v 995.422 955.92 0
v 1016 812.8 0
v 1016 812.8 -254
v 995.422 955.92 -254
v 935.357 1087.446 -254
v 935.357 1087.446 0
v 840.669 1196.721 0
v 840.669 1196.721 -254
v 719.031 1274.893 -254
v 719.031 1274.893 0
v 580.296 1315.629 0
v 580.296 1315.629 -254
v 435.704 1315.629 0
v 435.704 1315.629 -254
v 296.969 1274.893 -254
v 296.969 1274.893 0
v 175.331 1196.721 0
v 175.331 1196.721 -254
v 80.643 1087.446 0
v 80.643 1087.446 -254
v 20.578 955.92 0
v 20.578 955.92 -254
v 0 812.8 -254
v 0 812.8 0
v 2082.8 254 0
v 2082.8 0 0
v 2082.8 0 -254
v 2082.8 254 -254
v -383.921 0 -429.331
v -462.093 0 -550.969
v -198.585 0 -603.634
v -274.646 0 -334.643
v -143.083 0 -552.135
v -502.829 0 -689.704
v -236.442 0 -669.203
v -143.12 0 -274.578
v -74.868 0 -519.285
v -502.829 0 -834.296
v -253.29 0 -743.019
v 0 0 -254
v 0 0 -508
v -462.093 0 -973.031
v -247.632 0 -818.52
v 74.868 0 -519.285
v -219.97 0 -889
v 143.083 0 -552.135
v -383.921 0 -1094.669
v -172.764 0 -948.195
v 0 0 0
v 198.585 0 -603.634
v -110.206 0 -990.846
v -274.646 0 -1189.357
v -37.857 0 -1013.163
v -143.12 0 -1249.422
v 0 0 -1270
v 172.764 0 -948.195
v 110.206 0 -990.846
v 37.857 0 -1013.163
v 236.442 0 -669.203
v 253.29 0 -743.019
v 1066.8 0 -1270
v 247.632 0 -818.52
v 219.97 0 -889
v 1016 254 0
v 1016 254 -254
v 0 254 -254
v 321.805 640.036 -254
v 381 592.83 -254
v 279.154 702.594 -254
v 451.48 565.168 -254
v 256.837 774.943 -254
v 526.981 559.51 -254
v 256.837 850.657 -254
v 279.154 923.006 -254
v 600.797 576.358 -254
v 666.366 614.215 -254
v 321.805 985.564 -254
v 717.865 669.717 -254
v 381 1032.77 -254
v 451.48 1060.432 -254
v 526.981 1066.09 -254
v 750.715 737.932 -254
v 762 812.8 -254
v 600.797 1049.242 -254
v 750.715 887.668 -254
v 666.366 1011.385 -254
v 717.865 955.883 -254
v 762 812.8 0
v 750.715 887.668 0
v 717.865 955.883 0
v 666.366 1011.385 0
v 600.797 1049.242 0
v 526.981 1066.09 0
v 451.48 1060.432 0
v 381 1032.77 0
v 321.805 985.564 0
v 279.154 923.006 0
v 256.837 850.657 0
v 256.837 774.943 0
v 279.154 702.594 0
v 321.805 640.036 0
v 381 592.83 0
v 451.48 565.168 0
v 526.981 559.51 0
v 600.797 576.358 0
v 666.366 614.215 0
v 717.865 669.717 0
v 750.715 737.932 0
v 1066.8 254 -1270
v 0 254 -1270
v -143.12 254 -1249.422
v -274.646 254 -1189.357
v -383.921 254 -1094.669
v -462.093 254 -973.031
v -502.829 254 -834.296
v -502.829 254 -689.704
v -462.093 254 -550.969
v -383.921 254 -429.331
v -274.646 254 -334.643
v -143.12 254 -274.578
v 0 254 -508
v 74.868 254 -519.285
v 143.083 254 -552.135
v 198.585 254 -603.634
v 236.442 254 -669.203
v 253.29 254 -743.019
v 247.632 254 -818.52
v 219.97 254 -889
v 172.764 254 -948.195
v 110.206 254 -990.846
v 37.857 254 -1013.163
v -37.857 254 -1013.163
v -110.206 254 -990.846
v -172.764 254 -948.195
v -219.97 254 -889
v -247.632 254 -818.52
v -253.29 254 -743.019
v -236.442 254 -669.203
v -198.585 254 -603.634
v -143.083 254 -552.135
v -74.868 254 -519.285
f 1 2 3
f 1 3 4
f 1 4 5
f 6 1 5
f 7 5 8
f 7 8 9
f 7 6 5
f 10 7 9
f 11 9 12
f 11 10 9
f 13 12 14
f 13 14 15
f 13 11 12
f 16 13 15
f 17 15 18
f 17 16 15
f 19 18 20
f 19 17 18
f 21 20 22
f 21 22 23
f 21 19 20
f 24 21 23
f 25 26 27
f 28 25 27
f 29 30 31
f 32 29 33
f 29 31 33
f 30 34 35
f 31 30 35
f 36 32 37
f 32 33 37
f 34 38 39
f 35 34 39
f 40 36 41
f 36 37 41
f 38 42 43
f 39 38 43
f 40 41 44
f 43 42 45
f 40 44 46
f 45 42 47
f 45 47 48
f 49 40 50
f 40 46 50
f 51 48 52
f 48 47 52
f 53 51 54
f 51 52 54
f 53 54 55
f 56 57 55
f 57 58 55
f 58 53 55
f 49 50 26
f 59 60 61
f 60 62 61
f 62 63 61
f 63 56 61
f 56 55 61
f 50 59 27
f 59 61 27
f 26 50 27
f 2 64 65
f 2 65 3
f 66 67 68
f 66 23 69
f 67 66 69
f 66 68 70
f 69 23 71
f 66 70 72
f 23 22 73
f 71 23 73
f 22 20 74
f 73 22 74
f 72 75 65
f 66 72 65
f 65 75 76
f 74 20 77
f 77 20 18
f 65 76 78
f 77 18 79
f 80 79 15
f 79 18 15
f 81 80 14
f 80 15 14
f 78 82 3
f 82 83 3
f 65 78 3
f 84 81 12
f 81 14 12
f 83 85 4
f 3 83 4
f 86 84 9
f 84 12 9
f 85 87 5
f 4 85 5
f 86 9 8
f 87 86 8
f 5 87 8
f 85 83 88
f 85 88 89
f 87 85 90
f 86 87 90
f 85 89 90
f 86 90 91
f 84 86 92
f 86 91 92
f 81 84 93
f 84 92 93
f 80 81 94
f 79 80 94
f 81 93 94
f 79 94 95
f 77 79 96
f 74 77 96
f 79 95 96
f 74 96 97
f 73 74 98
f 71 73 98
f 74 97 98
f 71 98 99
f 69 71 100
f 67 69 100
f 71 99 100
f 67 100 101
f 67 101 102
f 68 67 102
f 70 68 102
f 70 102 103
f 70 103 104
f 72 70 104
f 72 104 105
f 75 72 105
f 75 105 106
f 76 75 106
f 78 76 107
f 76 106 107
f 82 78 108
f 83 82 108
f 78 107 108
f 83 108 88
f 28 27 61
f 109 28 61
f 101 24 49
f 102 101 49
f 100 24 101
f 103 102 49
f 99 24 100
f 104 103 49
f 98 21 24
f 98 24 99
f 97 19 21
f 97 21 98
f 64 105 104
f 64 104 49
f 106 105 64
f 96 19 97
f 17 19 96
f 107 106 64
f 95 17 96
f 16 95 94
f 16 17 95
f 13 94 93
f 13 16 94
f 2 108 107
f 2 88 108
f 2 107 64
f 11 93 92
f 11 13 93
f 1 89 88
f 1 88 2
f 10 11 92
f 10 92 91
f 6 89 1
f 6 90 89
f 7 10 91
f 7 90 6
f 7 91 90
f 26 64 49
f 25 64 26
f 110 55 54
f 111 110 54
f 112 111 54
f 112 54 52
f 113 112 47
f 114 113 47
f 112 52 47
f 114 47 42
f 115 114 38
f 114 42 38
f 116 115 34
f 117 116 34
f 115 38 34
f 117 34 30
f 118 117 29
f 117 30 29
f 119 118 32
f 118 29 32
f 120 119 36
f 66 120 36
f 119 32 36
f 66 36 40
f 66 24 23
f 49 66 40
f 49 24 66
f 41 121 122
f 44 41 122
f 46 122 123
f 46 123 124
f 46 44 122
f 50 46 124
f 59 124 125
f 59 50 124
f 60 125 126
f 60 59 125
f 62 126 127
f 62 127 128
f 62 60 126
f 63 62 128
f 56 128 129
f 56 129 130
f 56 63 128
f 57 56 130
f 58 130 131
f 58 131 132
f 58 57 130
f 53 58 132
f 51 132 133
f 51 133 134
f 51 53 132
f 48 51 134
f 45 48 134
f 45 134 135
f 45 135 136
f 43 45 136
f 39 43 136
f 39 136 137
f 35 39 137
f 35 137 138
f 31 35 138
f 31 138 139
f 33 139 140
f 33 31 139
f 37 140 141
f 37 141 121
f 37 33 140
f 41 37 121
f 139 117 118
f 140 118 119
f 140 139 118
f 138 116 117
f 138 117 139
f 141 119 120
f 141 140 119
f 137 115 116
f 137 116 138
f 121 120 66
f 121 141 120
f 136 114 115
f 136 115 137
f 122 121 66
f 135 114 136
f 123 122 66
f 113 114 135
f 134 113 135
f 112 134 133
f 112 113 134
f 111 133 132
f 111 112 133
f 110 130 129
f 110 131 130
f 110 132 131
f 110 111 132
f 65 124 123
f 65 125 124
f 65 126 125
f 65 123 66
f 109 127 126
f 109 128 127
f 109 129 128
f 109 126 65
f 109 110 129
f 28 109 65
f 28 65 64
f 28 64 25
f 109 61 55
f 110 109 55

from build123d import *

# Parameters (mm, degrees)
SKETCH1_R           = 254
SKETCH1_W           = 1016
SKETCH1_H           = 254
BOSS_EXTRUDE1_DEPTH = 254
SKETCH3_R           = 254
BOSS_EXTRUDE3_DEPTH = 254


with BuildPart() as part:
    # Sketch1 → Boss-Extrude1 (new body)
    # profile 1 of 2: a face of its own
    with BuildSketch(Plane(origin=(0, 0, 0), x_dir=(1, 0, 0), z_dir=(0, 1, 0))):
        with BuildLine():
            Line((1066.8, 1270), (0, 1270))
            ThreePointArc((0, 1270), (-508, 762), (0, 254))
            Line((0, 254), (1016, 254))
            Line((1016, 254), (1016, 0))
            Line((1016, 0), (2082.8, 0))
            Line((2082.8, 0), (2082.8, 254))
            Line((2082.8, 254), (1066.8, 1270))
        make_face()
        with Locations(Location((0, 762, 0), (0, 0, 270))):
            Circle(SKETCH1_R, mode=Mode.SUBTRACT)
    # profile 2 of 2: a face of its own
    with BuildSketch(Plane(origin=(0, 0, 0), x_dir=(1, 0, 0), z_dir=(0, 1, 0))):
        with Locations((508, 127)):
            Rectangle(SKETCH1_W, SKETCH1_H)
    extrude(amount=BOSS_EXTRUDE1_DEPTH)

    # Sketch3 → Boss-Extrude3 (add)
    with BuildSketch(Plane.XY):
        with BuildLine():
            Line((0, 812.8), (0, 254))
            Line((0, 254), (1016, 254))
            Line((1016, 254), (1016, 812.8))
            ThreePointArc((1016, 812.8), (508, 1320.8), (0, 812.8))
        make_face()
        with Locations((508, 812.8)):
            Circle(SKETCH3_R, mode=Mode.SUBTRACT)
    extrude(amount=-BOSS_EXTRUDE3_DEPTH)


solid = part.part
